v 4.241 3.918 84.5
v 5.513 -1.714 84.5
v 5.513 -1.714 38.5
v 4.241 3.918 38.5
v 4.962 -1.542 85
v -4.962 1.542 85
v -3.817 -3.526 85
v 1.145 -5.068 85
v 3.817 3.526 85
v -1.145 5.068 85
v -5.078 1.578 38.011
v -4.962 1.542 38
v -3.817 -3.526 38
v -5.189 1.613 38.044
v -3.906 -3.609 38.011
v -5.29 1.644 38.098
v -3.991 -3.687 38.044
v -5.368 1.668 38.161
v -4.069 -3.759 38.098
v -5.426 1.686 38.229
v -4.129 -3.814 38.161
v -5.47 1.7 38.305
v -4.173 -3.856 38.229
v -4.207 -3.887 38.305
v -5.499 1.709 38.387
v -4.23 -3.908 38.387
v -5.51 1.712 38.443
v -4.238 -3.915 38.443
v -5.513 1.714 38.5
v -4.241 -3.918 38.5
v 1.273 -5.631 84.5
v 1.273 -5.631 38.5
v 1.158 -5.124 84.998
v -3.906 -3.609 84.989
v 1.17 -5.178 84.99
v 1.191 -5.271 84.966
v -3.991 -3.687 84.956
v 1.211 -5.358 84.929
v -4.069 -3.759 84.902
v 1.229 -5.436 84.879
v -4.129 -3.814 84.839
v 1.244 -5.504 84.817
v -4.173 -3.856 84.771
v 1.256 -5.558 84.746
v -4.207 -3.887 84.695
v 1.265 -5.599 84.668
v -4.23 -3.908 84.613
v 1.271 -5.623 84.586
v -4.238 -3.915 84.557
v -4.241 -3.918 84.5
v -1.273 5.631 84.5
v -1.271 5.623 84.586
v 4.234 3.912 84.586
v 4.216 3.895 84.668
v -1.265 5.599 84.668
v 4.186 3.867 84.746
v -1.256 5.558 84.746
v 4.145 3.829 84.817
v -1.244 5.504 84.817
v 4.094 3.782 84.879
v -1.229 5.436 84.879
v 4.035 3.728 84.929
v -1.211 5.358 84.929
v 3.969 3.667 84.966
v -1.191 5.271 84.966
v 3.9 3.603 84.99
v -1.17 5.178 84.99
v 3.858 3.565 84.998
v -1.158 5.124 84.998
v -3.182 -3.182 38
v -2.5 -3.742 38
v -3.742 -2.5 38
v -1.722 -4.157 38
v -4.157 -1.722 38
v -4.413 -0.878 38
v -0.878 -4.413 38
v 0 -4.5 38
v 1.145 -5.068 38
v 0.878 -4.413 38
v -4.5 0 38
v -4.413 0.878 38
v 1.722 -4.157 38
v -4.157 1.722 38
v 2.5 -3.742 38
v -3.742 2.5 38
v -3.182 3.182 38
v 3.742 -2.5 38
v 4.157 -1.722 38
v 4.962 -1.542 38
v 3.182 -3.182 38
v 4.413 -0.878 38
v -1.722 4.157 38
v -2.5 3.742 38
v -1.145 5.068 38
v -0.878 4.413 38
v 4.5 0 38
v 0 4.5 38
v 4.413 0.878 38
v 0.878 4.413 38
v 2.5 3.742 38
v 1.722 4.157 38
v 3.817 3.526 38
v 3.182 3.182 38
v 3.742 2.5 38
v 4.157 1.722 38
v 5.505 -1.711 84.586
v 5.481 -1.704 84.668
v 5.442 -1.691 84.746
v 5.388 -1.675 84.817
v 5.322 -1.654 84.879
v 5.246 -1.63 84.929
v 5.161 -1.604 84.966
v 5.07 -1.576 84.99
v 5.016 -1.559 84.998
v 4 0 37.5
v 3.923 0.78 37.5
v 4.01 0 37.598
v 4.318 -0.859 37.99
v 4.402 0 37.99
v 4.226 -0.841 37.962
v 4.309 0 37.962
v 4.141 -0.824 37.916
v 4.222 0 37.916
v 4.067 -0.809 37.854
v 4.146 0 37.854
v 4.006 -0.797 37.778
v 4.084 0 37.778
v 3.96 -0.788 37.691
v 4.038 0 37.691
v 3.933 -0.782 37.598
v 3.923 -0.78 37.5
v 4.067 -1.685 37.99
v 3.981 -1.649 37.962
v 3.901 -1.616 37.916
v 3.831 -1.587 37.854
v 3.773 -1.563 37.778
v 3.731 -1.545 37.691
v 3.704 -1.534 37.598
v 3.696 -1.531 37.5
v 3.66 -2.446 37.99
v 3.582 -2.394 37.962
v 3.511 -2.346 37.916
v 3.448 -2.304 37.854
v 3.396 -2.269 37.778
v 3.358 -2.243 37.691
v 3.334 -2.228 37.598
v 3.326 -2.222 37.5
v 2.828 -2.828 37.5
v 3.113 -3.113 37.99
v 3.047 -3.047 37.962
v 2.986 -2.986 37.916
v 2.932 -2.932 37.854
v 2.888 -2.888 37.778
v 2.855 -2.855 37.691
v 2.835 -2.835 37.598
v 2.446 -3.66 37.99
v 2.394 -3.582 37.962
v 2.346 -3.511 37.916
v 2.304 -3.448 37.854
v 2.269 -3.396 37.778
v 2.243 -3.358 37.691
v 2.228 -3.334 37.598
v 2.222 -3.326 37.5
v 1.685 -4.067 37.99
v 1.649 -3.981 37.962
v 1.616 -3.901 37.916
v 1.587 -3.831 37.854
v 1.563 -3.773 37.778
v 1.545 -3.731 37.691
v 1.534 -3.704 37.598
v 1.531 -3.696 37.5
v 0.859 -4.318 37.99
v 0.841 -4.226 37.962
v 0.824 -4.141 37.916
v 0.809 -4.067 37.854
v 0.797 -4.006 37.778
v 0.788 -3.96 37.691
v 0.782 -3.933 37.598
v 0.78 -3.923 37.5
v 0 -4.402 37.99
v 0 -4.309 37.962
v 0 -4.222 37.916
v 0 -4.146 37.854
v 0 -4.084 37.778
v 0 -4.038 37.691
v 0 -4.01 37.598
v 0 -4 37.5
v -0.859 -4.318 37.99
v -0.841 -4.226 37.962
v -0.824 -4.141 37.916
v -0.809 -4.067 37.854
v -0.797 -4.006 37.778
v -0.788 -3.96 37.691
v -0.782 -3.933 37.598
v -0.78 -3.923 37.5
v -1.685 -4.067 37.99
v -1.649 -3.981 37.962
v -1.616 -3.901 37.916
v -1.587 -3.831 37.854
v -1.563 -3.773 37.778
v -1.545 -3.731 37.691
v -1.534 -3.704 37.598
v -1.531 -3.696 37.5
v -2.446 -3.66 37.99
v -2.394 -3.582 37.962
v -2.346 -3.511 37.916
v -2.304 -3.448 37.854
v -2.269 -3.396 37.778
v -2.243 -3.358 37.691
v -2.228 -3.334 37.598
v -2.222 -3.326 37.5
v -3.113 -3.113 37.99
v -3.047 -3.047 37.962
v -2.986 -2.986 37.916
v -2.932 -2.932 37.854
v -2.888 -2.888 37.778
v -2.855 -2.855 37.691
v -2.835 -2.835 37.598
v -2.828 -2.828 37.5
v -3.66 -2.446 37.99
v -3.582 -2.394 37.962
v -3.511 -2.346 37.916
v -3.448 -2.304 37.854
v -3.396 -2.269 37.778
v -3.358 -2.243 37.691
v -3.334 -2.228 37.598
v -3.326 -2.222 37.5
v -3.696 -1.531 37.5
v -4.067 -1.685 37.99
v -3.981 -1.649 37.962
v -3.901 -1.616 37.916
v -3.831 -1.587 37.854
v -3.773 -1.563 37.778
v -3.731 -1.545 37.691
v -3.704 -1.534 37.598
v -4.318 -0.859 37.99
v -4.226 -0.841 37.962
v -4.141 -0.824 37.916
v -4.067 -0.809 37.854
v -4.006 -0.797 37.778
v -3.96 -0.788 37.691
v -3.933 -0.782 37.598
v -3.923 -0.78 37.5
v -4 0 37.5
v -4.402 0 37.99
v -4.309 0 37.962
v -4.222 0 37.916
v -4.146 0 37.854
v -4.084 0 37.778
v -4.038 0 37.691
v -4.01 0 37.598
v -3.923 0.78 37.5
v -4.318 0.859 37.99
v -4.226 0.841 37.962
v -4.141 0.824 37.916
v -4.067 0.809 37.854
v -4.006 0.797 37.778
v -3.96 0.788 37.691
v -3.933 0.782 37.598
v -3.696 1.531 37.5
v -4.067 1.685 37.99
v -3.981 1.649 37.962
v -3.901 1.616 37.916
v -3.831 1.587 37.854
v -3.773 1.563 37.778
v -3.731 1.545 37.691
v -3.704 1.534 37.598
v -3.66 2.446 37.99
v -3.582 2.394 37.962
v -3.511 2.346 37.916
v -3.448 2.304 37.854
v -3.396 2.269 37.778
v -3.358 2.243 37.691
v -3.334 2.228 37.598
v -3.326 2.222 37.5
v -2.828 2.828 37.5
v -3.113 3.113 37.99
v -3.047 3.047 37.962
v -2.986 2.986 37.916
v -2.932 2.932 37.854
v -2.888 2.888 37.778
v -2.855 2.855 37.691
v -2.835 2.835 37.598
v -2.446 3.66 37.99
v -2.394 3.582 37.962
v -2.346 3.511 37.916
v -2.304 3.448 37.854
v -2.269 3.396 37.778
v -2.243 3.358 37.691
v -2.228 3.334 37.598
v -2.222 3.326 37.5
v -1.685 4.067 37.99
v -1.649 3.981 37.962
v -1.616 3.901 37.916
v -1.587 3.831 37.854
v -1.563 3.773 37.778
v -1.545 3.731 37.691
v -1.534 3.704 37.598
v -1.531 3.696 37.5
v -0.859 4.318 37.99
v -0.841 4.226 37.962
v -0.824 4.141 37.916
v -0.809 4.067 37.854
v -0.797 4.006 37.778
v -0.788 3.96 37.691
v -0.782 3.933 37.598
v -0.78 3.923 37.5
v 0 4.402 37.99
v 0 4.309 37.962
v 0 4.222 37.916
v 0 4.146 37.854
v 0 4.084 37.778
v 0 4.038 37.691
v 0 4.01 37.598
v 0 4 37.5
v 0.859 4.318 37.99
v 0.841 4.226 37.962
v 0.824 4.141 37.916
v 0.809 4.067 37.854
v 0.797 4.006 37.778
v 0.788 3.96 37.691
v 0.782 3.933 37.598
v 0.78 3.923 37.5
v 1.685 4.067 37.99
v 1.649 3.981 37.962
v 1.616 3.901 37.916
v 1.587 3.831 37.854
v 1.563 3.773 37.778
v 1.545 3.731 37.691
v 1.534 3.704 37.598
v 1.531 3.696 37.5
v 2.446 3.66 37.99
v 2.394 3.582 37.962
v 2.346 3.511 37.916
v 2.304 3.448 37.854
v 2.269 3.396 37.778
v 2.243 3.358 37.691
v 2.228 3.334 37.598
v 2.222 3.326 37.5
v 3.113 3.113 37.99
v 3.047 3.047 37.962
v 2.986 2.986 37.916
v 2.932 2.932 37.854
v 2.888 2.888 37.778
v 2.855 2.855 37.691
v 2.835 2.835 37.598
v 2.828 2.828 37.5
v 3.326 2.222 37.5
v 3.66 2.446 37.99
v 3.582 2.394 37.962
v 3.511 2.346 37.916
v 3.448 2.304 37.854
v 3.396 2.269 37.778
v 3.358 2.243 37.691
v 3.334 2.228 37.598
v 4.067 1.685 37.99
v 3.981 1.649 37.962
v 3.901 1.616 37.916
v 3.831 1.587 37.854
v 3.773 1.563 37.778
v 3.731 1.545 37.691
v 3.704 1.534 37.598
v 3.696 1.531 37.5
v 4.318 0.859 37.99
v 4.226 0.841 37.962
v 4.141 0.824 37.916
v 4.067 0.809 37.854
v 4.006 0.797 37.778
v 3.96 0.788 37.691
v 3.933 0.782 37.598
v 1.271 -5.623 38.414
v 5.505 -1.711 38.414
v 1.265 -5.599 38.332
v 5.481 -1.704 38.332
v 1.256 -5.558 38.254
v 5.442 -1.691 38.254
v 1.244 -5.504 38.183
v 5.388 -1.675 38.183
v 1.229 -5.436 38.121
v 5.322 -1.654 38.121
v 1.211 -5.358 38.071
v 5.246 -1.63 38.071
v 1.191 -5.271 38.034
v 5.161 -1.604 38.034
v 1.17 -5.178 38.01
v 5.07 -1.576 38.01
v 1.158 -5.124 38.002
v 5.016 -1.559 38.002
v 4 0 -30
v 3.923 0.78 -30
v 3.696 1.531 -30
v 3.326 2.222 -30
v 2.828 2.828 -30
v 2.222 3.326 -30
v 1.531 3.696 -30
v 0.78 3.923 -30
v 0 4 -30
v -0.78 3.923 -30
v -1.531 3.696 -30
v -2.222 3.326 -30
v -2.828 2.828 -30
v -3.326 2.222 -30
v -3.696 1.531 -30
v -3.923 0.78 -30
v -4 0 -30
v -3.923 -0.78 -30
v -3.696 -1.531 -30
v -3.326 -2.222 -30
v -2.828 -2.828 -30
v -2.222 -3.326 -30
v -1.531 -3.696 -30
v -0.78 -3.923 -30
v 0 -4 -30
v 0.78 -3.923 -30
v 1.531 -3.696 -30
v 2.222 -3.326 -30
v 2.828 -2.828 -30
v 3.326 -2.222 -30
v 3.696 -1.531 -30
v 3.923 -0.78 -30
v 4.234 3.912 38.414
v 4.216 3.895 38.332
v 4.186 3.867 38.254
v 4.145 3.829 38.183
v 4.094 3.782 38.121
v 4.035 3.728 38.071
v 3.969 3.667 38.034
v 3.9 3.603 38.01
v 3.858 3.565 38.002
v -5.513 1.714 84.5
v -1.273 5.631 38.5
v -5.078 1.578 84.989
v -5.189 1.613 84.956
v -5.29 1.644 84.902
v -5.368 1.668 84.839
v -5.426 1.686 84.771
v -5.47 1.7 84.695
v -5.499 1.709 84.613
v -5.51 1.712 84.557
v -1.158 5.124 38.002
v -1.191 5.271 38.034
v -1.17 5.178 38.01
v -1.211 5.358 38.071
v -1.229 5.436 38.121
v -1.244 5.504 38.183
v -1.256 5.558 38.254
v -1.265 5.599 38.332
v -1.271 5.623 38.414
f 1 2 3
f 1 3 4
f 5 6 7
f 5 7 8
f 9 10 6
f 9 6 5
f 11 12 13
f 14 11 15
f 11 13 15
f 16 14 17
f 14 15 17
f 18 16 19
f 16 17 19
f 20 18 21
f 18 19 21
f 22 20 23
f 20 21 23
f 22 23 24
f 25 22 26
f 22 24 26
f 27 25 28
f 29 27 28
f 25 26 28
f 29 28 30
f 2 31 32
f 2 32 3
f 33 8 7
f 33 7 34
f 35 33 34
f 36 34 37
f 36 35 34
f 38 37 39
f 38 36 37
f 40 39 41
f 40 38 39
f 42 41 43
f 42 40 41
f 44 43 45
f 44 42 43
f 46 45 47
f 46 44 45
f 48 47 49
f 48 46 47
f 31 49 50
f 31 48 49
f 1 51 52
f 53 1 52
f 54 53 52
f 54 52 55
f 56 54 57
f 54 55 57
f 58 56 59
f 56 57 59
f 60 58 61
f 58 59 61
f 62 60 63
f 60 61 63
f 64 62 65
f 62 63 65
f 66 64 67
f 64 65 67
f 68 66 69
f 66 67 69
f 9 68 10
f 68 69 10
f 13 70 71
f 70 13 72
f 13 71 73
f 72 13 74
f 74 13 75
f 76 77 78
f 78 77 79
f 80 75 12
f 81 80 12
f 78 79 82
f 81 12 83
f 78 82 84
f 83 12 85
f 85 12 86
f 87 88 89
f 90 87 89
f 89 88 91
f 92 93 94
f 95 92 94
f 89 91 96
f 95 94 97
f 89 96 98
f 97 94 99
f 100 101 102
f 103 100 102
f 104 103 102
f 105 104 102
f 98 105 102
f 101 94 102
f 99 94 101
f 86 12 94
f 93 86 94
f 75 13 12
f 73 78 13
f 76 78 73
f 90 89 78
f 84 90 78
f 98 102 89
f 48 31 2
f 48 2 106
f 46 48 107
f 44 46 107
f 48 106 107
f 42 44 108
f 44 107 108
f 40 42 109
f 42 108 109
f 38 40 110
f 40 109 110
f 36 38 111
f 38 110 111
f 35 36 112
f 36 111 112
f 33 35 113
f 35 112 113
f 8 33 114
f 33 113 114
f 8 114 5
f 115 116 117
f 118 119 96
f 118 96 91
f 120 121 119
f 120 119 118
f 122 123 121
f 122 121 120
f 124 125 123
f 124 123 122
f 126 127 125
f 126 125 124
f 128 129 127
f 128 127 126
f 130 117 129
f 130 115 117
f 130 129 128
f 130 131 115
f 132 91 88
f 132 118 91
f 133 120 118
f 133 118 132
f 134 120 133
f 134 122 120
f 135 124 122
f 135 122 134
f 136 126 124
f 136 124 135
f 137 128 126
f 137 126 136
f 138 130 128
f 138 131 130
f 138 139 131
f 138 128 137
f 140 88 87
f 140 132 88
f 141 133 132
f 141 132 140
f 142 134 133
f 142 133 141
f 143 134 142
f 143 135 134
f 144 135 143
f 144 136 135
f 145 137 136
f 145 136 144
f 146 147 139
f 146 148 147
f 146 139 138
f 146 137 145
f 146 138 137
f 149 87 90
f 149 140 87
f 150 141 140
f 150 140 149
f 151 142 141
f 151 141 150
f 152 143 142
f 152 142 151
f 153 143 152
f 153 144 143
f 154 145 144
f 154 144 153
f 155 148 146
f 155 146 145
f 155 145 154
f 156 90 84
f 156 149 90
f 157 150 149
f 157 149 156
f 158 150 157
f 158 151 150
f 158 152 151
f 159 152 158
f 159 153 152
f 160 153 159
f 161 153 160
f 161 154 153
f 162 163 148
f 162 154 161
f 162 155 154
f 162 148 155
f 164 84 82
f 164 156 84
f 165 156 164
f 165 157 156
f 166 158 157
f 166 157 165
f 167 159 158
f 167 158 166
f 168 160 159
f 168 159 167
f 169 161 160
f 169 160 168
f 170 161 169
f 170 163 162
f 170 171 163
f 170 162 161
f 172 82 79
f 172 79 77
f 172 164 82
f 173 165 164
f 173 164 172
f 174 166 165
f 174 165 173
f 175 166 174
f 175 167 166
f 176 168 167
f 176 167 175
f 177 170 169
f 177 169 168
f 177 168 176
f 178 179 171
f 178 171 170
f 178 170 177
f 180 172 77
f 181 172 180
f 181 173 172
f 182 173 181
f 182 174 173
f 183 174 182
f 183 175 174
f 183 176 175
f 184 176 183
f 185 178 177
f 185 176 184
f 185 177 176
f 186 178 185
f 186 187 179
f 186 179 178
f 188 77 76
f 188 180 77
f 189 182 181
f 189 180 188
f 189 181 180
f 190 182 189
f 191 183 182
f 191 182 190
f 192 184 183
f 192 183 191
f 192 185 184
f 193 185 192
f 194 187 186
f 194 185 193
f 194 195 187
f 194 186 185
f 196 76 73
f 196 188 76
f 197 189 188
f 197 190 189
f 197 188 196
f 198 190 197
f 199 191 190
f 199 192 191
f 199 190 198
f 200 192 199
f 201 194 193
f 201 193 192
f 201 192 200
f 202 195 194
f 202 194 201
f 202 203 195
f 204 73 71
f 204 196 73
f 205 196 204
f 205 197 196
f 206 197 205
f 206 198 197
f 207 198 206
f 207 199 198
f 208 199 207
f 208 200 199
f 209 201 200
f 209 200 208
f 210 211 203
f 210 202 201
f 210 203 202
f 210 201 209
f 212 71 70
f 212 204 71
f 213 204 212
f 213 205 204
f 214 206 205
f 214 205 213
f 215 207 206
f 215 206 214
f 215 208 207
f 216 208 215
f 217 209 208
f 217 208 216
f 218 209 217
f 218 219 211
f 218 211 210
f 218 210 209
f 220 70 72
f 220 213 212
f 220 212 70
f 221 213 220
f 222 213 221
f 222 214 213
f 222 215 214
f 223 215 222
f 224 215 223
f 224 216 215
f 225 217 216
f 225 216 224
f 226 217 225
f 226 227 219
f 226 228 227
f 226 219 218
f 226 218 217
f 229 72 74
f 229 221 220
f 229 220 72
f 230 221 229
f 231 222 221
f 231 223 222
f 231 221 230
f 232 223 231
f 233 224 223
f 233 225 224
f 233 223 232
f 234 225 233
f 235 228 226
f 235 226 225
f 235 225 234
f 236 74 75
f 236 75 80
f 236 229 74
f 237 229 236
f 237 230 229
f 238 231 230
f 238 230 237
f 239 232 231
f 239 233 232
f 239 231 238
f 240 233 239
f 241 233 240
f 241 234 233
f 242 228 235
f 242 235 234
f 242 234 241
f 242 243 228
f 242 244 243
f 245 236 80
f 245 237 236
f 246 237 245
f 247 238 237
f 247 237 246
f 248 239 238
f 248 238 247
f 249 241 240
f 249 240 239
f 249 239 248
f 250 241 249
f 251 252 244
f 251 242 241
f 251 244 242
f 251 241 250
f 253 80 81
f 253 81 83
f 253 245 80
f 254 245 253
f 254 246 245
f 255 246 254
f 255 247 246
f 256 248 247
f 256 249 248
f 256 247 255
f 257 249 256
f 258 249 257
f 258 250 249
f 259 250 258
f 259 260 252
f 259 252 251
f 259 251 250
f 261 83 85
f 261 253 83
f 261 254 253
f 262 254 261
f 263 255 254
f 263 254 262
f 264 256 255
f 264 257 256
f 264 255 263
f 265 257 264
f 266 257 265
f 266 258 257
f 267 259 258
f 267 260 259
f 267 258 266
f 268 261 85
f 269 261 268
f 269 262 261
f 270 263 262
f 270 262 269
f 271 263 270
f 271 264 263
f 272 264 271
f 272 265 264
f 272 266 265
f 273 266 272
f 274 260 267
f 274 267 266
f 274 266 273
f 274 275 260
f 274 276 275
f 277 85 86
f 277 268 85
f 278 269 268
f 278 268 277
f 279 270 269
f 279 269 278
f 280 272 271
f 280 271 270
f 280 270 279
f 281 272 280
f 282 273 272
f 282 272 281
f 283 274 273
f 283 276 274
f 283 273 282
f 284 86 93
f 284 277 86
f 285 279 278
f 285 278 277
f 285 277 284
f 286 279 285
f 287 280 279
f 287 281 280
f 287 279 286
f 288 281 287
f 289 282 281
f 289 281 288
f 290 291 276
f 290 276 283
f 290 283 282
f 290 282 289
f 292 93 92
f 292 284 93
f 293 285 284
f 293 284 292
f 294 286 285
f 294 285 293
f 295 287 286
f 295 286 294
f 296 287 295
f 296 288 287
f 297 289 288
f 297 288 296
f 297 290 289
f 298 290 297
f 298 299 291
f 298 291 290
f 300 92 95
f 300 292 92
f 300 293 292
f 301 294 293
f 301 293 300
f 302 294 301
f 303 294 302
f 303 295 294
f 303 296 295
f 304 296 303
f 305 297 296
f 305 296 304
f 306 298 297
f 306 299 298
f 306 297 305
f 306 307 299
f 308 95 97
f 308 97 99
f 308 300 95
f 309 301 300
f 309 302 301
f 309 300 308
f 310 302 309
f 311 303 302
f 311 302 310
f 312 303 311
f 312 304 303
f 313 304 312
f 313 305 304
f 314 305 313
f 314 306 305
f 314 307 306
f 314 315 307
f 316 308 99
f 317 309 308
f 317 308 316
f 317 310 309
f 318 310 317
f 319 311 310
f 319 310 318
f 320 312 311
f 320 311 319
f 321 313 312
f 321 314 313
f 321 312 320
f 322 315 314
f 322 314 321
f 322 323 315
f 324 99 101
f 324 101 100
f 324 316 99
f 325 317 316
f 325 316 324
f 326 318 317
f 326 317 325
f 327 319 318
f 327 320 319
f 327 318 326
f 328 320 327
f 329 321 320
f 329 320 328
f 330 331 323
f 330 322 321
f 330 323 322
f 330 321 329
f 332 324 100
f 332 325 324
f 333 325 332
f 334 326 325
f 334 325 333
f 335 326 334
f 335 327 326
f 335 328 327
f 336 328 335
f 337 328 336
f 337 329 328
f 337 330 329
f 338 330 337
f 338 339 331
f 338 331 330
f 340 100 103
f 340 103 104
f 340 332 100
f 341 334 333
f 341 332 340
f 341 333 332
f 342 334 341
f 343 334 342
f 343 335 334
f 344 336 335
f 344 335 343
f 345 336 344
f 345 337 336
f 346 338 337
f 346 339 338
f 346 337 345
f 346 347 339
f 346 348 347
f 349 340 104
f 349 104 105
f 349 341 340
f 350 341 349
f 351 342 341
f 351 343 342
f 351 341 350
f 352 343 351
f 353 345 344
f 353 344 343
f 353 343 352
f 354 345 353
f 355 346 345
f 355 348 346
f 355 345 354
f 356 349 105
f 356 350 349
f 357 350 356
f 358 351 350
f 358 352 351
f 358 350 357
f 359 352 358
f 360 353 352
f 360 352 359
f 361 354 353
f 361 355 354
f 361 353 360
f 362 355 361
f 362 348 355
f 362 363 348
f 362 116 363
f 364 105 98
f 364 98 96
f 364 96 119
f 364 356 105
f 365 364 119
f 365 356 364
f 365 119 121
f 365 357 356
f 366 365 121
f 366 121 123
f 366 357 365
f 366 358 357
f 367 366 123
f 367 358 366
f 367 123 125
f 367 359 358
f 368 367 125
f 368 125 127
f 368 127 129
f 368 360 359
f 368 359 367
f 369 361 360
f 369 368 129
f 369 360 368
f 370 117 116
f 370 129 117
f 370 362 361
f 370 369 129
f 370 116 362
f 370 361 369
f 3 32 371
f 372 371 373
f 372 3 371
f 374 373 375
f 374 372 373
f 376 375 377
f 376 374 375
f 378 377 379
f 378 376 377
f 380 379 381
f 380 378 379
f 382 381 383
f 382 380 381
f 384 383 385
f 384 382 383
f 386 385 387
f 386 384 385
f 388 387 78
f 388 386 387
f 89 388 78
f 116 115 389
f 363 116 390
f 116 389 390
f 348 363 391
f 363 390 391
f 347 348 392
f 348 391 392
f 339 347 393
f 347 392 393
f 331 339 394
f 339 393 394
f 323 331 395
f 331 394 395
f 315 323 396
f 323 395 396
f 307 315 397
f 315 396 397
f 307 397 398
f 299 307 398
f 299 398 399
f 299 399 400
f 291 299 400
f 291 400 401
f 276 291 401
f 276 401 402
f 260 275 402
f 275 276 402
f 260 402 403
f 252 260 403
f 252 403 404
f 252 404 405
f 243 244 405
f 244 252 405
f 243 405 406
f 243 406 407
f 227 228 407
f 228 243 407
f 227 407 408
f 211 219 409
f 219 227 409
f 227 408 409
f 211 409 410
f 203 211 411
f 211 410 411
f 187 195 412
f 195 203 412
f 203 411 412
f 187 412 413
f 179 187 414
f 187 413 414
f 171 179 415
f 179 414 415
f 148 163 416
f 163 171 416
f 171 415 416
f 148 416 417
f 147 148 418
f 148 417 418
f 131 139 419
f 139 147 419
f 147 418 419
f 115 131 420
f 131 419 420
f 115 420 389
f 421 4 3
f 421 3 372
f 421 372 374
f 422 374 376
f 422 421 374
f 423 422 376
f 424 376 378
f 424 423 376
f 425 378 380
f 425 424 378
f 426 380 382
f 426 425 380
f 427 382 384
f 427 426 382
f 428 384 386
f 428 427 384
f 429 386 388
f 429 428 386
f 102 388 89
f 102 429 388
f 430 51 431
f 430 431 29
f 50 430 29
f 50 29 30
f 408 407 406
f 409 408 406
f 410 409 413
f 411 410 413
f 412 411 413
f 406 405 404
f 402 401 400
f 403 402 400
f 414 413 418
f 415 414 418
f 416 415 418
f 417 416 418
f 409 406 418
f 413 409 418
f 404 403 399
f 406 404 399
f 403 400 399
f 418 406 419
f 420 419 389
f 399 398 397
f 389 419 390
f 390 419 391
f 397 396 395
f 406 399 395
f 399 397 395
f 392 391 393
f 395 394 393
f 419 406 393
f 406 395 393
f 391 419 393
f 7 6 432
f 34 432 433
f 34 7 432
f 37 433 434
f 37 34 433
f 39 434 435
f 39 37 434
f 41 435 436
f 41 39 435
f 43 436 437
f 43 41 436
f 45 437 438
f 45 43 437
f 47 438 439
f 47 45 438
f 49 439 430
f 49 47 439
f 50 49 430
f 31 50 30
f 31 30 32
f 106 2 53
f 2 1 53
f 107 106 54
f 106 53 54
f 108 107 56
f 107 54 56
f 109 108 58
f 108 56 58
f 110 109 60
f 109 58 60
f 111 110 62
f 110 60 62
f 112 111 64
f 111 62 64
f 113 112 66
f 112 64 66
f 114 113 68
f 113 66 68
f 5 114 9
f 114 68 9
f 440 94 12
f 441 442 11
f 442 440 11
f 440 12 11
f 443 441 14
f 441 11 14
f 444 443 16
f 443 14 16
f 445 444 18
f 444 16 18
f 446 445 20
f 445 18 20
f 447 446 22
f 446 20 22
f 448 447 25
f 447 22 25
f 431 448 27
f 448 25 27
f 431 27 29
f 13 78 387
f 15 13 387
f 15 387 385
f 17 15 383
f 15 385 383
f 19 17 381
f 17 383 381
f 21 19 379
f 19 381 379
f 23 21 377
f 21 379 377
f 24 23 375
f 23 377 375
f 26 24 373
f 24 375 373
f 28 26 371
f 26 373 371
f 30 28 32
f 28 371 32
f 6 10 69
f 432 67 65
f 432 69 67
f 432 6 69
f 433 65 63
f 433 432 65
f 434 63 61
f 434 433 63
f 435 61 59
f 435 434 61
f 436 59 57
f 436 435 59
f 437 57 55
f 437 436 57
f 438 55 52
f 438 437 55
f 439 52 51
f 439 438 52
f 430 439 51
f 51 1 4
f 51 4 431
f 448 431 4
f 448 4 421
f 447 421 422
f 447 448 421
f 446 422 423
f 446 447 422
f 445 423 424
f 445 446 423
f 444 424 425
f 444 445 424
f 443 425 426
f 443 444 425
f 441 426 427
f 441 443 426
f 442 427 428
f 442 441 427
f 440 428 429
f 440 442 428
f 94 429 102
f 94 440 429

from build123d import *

# Parameters (mm, degrees)
BOSS_EXTRUDE1_DEPTH      = 85
BOSS_EXTRUDE1_DEPTH_BACK = 30
SKETCH1_R                = 4
BOSS_EXTRUDE2_DEPTH      = 47
FILLET1_R                = 0.5


with BuildPart() as part:
    # Sketch1 → Boss-Extrude1 (new, two sides: drawn at the far end of the back side and taken through both)
    with BuildSketch(Plane.XY.offset(-BOSS_EXTRUDE1_DEPTH_BACK)):
        Circle(SKETCH1_R)
    extrude(amount=BOSS_EXTRUDE1_DEPTH + BOSS_EXTRUDE1_DEPTH_BACK)

    # Sketch2 → Boss-Extrude2 (add)
    with BuildSketch(Plane.XY.offset(85)):
        Polygon((5.513335358, -1.713612138), (4.240699323, 3.917882411), (-1.272636036, 5.631494549), (-5.513335358, 1.713612138), (-4.240699323, -3.917882411), (1.272636036, -5.631494549), align=None)
    extrude(amount=-BOSS_EXTRUDE2_DEPTH)

    # Fillet1
    fillet1_edges = [part.edges().sort_by_distance(p)[0] for p in [
        (1.484031644, 4.77468848, 38),
        (4.877017341, 1.102135137, 38),
        (3.392985697, -3.672553343, 85),
        (4.877017341, 1.102135137, 85),
        (1.484031644, 4.77468848, 85),
        (-3.392985697, 3.672553343, 85),
        (-4.877017341, -1.102135137, 85),
        (-1.484031644, -4.77468848, 85),
        (-4, 0, 38),
        (3.392985697, -3.672553343, 38),
        (-1.484031644, -4.77468848, 38),
        (-4.877017341, -1.102135137, 38),
        (-3.392985697, 3.672553343, 38),
    ]]
    fillet(fillet1_edges, radius=FILLET1_R - 0.0001)  # a hair under: the kernel refuses the full size


solid = part.part
